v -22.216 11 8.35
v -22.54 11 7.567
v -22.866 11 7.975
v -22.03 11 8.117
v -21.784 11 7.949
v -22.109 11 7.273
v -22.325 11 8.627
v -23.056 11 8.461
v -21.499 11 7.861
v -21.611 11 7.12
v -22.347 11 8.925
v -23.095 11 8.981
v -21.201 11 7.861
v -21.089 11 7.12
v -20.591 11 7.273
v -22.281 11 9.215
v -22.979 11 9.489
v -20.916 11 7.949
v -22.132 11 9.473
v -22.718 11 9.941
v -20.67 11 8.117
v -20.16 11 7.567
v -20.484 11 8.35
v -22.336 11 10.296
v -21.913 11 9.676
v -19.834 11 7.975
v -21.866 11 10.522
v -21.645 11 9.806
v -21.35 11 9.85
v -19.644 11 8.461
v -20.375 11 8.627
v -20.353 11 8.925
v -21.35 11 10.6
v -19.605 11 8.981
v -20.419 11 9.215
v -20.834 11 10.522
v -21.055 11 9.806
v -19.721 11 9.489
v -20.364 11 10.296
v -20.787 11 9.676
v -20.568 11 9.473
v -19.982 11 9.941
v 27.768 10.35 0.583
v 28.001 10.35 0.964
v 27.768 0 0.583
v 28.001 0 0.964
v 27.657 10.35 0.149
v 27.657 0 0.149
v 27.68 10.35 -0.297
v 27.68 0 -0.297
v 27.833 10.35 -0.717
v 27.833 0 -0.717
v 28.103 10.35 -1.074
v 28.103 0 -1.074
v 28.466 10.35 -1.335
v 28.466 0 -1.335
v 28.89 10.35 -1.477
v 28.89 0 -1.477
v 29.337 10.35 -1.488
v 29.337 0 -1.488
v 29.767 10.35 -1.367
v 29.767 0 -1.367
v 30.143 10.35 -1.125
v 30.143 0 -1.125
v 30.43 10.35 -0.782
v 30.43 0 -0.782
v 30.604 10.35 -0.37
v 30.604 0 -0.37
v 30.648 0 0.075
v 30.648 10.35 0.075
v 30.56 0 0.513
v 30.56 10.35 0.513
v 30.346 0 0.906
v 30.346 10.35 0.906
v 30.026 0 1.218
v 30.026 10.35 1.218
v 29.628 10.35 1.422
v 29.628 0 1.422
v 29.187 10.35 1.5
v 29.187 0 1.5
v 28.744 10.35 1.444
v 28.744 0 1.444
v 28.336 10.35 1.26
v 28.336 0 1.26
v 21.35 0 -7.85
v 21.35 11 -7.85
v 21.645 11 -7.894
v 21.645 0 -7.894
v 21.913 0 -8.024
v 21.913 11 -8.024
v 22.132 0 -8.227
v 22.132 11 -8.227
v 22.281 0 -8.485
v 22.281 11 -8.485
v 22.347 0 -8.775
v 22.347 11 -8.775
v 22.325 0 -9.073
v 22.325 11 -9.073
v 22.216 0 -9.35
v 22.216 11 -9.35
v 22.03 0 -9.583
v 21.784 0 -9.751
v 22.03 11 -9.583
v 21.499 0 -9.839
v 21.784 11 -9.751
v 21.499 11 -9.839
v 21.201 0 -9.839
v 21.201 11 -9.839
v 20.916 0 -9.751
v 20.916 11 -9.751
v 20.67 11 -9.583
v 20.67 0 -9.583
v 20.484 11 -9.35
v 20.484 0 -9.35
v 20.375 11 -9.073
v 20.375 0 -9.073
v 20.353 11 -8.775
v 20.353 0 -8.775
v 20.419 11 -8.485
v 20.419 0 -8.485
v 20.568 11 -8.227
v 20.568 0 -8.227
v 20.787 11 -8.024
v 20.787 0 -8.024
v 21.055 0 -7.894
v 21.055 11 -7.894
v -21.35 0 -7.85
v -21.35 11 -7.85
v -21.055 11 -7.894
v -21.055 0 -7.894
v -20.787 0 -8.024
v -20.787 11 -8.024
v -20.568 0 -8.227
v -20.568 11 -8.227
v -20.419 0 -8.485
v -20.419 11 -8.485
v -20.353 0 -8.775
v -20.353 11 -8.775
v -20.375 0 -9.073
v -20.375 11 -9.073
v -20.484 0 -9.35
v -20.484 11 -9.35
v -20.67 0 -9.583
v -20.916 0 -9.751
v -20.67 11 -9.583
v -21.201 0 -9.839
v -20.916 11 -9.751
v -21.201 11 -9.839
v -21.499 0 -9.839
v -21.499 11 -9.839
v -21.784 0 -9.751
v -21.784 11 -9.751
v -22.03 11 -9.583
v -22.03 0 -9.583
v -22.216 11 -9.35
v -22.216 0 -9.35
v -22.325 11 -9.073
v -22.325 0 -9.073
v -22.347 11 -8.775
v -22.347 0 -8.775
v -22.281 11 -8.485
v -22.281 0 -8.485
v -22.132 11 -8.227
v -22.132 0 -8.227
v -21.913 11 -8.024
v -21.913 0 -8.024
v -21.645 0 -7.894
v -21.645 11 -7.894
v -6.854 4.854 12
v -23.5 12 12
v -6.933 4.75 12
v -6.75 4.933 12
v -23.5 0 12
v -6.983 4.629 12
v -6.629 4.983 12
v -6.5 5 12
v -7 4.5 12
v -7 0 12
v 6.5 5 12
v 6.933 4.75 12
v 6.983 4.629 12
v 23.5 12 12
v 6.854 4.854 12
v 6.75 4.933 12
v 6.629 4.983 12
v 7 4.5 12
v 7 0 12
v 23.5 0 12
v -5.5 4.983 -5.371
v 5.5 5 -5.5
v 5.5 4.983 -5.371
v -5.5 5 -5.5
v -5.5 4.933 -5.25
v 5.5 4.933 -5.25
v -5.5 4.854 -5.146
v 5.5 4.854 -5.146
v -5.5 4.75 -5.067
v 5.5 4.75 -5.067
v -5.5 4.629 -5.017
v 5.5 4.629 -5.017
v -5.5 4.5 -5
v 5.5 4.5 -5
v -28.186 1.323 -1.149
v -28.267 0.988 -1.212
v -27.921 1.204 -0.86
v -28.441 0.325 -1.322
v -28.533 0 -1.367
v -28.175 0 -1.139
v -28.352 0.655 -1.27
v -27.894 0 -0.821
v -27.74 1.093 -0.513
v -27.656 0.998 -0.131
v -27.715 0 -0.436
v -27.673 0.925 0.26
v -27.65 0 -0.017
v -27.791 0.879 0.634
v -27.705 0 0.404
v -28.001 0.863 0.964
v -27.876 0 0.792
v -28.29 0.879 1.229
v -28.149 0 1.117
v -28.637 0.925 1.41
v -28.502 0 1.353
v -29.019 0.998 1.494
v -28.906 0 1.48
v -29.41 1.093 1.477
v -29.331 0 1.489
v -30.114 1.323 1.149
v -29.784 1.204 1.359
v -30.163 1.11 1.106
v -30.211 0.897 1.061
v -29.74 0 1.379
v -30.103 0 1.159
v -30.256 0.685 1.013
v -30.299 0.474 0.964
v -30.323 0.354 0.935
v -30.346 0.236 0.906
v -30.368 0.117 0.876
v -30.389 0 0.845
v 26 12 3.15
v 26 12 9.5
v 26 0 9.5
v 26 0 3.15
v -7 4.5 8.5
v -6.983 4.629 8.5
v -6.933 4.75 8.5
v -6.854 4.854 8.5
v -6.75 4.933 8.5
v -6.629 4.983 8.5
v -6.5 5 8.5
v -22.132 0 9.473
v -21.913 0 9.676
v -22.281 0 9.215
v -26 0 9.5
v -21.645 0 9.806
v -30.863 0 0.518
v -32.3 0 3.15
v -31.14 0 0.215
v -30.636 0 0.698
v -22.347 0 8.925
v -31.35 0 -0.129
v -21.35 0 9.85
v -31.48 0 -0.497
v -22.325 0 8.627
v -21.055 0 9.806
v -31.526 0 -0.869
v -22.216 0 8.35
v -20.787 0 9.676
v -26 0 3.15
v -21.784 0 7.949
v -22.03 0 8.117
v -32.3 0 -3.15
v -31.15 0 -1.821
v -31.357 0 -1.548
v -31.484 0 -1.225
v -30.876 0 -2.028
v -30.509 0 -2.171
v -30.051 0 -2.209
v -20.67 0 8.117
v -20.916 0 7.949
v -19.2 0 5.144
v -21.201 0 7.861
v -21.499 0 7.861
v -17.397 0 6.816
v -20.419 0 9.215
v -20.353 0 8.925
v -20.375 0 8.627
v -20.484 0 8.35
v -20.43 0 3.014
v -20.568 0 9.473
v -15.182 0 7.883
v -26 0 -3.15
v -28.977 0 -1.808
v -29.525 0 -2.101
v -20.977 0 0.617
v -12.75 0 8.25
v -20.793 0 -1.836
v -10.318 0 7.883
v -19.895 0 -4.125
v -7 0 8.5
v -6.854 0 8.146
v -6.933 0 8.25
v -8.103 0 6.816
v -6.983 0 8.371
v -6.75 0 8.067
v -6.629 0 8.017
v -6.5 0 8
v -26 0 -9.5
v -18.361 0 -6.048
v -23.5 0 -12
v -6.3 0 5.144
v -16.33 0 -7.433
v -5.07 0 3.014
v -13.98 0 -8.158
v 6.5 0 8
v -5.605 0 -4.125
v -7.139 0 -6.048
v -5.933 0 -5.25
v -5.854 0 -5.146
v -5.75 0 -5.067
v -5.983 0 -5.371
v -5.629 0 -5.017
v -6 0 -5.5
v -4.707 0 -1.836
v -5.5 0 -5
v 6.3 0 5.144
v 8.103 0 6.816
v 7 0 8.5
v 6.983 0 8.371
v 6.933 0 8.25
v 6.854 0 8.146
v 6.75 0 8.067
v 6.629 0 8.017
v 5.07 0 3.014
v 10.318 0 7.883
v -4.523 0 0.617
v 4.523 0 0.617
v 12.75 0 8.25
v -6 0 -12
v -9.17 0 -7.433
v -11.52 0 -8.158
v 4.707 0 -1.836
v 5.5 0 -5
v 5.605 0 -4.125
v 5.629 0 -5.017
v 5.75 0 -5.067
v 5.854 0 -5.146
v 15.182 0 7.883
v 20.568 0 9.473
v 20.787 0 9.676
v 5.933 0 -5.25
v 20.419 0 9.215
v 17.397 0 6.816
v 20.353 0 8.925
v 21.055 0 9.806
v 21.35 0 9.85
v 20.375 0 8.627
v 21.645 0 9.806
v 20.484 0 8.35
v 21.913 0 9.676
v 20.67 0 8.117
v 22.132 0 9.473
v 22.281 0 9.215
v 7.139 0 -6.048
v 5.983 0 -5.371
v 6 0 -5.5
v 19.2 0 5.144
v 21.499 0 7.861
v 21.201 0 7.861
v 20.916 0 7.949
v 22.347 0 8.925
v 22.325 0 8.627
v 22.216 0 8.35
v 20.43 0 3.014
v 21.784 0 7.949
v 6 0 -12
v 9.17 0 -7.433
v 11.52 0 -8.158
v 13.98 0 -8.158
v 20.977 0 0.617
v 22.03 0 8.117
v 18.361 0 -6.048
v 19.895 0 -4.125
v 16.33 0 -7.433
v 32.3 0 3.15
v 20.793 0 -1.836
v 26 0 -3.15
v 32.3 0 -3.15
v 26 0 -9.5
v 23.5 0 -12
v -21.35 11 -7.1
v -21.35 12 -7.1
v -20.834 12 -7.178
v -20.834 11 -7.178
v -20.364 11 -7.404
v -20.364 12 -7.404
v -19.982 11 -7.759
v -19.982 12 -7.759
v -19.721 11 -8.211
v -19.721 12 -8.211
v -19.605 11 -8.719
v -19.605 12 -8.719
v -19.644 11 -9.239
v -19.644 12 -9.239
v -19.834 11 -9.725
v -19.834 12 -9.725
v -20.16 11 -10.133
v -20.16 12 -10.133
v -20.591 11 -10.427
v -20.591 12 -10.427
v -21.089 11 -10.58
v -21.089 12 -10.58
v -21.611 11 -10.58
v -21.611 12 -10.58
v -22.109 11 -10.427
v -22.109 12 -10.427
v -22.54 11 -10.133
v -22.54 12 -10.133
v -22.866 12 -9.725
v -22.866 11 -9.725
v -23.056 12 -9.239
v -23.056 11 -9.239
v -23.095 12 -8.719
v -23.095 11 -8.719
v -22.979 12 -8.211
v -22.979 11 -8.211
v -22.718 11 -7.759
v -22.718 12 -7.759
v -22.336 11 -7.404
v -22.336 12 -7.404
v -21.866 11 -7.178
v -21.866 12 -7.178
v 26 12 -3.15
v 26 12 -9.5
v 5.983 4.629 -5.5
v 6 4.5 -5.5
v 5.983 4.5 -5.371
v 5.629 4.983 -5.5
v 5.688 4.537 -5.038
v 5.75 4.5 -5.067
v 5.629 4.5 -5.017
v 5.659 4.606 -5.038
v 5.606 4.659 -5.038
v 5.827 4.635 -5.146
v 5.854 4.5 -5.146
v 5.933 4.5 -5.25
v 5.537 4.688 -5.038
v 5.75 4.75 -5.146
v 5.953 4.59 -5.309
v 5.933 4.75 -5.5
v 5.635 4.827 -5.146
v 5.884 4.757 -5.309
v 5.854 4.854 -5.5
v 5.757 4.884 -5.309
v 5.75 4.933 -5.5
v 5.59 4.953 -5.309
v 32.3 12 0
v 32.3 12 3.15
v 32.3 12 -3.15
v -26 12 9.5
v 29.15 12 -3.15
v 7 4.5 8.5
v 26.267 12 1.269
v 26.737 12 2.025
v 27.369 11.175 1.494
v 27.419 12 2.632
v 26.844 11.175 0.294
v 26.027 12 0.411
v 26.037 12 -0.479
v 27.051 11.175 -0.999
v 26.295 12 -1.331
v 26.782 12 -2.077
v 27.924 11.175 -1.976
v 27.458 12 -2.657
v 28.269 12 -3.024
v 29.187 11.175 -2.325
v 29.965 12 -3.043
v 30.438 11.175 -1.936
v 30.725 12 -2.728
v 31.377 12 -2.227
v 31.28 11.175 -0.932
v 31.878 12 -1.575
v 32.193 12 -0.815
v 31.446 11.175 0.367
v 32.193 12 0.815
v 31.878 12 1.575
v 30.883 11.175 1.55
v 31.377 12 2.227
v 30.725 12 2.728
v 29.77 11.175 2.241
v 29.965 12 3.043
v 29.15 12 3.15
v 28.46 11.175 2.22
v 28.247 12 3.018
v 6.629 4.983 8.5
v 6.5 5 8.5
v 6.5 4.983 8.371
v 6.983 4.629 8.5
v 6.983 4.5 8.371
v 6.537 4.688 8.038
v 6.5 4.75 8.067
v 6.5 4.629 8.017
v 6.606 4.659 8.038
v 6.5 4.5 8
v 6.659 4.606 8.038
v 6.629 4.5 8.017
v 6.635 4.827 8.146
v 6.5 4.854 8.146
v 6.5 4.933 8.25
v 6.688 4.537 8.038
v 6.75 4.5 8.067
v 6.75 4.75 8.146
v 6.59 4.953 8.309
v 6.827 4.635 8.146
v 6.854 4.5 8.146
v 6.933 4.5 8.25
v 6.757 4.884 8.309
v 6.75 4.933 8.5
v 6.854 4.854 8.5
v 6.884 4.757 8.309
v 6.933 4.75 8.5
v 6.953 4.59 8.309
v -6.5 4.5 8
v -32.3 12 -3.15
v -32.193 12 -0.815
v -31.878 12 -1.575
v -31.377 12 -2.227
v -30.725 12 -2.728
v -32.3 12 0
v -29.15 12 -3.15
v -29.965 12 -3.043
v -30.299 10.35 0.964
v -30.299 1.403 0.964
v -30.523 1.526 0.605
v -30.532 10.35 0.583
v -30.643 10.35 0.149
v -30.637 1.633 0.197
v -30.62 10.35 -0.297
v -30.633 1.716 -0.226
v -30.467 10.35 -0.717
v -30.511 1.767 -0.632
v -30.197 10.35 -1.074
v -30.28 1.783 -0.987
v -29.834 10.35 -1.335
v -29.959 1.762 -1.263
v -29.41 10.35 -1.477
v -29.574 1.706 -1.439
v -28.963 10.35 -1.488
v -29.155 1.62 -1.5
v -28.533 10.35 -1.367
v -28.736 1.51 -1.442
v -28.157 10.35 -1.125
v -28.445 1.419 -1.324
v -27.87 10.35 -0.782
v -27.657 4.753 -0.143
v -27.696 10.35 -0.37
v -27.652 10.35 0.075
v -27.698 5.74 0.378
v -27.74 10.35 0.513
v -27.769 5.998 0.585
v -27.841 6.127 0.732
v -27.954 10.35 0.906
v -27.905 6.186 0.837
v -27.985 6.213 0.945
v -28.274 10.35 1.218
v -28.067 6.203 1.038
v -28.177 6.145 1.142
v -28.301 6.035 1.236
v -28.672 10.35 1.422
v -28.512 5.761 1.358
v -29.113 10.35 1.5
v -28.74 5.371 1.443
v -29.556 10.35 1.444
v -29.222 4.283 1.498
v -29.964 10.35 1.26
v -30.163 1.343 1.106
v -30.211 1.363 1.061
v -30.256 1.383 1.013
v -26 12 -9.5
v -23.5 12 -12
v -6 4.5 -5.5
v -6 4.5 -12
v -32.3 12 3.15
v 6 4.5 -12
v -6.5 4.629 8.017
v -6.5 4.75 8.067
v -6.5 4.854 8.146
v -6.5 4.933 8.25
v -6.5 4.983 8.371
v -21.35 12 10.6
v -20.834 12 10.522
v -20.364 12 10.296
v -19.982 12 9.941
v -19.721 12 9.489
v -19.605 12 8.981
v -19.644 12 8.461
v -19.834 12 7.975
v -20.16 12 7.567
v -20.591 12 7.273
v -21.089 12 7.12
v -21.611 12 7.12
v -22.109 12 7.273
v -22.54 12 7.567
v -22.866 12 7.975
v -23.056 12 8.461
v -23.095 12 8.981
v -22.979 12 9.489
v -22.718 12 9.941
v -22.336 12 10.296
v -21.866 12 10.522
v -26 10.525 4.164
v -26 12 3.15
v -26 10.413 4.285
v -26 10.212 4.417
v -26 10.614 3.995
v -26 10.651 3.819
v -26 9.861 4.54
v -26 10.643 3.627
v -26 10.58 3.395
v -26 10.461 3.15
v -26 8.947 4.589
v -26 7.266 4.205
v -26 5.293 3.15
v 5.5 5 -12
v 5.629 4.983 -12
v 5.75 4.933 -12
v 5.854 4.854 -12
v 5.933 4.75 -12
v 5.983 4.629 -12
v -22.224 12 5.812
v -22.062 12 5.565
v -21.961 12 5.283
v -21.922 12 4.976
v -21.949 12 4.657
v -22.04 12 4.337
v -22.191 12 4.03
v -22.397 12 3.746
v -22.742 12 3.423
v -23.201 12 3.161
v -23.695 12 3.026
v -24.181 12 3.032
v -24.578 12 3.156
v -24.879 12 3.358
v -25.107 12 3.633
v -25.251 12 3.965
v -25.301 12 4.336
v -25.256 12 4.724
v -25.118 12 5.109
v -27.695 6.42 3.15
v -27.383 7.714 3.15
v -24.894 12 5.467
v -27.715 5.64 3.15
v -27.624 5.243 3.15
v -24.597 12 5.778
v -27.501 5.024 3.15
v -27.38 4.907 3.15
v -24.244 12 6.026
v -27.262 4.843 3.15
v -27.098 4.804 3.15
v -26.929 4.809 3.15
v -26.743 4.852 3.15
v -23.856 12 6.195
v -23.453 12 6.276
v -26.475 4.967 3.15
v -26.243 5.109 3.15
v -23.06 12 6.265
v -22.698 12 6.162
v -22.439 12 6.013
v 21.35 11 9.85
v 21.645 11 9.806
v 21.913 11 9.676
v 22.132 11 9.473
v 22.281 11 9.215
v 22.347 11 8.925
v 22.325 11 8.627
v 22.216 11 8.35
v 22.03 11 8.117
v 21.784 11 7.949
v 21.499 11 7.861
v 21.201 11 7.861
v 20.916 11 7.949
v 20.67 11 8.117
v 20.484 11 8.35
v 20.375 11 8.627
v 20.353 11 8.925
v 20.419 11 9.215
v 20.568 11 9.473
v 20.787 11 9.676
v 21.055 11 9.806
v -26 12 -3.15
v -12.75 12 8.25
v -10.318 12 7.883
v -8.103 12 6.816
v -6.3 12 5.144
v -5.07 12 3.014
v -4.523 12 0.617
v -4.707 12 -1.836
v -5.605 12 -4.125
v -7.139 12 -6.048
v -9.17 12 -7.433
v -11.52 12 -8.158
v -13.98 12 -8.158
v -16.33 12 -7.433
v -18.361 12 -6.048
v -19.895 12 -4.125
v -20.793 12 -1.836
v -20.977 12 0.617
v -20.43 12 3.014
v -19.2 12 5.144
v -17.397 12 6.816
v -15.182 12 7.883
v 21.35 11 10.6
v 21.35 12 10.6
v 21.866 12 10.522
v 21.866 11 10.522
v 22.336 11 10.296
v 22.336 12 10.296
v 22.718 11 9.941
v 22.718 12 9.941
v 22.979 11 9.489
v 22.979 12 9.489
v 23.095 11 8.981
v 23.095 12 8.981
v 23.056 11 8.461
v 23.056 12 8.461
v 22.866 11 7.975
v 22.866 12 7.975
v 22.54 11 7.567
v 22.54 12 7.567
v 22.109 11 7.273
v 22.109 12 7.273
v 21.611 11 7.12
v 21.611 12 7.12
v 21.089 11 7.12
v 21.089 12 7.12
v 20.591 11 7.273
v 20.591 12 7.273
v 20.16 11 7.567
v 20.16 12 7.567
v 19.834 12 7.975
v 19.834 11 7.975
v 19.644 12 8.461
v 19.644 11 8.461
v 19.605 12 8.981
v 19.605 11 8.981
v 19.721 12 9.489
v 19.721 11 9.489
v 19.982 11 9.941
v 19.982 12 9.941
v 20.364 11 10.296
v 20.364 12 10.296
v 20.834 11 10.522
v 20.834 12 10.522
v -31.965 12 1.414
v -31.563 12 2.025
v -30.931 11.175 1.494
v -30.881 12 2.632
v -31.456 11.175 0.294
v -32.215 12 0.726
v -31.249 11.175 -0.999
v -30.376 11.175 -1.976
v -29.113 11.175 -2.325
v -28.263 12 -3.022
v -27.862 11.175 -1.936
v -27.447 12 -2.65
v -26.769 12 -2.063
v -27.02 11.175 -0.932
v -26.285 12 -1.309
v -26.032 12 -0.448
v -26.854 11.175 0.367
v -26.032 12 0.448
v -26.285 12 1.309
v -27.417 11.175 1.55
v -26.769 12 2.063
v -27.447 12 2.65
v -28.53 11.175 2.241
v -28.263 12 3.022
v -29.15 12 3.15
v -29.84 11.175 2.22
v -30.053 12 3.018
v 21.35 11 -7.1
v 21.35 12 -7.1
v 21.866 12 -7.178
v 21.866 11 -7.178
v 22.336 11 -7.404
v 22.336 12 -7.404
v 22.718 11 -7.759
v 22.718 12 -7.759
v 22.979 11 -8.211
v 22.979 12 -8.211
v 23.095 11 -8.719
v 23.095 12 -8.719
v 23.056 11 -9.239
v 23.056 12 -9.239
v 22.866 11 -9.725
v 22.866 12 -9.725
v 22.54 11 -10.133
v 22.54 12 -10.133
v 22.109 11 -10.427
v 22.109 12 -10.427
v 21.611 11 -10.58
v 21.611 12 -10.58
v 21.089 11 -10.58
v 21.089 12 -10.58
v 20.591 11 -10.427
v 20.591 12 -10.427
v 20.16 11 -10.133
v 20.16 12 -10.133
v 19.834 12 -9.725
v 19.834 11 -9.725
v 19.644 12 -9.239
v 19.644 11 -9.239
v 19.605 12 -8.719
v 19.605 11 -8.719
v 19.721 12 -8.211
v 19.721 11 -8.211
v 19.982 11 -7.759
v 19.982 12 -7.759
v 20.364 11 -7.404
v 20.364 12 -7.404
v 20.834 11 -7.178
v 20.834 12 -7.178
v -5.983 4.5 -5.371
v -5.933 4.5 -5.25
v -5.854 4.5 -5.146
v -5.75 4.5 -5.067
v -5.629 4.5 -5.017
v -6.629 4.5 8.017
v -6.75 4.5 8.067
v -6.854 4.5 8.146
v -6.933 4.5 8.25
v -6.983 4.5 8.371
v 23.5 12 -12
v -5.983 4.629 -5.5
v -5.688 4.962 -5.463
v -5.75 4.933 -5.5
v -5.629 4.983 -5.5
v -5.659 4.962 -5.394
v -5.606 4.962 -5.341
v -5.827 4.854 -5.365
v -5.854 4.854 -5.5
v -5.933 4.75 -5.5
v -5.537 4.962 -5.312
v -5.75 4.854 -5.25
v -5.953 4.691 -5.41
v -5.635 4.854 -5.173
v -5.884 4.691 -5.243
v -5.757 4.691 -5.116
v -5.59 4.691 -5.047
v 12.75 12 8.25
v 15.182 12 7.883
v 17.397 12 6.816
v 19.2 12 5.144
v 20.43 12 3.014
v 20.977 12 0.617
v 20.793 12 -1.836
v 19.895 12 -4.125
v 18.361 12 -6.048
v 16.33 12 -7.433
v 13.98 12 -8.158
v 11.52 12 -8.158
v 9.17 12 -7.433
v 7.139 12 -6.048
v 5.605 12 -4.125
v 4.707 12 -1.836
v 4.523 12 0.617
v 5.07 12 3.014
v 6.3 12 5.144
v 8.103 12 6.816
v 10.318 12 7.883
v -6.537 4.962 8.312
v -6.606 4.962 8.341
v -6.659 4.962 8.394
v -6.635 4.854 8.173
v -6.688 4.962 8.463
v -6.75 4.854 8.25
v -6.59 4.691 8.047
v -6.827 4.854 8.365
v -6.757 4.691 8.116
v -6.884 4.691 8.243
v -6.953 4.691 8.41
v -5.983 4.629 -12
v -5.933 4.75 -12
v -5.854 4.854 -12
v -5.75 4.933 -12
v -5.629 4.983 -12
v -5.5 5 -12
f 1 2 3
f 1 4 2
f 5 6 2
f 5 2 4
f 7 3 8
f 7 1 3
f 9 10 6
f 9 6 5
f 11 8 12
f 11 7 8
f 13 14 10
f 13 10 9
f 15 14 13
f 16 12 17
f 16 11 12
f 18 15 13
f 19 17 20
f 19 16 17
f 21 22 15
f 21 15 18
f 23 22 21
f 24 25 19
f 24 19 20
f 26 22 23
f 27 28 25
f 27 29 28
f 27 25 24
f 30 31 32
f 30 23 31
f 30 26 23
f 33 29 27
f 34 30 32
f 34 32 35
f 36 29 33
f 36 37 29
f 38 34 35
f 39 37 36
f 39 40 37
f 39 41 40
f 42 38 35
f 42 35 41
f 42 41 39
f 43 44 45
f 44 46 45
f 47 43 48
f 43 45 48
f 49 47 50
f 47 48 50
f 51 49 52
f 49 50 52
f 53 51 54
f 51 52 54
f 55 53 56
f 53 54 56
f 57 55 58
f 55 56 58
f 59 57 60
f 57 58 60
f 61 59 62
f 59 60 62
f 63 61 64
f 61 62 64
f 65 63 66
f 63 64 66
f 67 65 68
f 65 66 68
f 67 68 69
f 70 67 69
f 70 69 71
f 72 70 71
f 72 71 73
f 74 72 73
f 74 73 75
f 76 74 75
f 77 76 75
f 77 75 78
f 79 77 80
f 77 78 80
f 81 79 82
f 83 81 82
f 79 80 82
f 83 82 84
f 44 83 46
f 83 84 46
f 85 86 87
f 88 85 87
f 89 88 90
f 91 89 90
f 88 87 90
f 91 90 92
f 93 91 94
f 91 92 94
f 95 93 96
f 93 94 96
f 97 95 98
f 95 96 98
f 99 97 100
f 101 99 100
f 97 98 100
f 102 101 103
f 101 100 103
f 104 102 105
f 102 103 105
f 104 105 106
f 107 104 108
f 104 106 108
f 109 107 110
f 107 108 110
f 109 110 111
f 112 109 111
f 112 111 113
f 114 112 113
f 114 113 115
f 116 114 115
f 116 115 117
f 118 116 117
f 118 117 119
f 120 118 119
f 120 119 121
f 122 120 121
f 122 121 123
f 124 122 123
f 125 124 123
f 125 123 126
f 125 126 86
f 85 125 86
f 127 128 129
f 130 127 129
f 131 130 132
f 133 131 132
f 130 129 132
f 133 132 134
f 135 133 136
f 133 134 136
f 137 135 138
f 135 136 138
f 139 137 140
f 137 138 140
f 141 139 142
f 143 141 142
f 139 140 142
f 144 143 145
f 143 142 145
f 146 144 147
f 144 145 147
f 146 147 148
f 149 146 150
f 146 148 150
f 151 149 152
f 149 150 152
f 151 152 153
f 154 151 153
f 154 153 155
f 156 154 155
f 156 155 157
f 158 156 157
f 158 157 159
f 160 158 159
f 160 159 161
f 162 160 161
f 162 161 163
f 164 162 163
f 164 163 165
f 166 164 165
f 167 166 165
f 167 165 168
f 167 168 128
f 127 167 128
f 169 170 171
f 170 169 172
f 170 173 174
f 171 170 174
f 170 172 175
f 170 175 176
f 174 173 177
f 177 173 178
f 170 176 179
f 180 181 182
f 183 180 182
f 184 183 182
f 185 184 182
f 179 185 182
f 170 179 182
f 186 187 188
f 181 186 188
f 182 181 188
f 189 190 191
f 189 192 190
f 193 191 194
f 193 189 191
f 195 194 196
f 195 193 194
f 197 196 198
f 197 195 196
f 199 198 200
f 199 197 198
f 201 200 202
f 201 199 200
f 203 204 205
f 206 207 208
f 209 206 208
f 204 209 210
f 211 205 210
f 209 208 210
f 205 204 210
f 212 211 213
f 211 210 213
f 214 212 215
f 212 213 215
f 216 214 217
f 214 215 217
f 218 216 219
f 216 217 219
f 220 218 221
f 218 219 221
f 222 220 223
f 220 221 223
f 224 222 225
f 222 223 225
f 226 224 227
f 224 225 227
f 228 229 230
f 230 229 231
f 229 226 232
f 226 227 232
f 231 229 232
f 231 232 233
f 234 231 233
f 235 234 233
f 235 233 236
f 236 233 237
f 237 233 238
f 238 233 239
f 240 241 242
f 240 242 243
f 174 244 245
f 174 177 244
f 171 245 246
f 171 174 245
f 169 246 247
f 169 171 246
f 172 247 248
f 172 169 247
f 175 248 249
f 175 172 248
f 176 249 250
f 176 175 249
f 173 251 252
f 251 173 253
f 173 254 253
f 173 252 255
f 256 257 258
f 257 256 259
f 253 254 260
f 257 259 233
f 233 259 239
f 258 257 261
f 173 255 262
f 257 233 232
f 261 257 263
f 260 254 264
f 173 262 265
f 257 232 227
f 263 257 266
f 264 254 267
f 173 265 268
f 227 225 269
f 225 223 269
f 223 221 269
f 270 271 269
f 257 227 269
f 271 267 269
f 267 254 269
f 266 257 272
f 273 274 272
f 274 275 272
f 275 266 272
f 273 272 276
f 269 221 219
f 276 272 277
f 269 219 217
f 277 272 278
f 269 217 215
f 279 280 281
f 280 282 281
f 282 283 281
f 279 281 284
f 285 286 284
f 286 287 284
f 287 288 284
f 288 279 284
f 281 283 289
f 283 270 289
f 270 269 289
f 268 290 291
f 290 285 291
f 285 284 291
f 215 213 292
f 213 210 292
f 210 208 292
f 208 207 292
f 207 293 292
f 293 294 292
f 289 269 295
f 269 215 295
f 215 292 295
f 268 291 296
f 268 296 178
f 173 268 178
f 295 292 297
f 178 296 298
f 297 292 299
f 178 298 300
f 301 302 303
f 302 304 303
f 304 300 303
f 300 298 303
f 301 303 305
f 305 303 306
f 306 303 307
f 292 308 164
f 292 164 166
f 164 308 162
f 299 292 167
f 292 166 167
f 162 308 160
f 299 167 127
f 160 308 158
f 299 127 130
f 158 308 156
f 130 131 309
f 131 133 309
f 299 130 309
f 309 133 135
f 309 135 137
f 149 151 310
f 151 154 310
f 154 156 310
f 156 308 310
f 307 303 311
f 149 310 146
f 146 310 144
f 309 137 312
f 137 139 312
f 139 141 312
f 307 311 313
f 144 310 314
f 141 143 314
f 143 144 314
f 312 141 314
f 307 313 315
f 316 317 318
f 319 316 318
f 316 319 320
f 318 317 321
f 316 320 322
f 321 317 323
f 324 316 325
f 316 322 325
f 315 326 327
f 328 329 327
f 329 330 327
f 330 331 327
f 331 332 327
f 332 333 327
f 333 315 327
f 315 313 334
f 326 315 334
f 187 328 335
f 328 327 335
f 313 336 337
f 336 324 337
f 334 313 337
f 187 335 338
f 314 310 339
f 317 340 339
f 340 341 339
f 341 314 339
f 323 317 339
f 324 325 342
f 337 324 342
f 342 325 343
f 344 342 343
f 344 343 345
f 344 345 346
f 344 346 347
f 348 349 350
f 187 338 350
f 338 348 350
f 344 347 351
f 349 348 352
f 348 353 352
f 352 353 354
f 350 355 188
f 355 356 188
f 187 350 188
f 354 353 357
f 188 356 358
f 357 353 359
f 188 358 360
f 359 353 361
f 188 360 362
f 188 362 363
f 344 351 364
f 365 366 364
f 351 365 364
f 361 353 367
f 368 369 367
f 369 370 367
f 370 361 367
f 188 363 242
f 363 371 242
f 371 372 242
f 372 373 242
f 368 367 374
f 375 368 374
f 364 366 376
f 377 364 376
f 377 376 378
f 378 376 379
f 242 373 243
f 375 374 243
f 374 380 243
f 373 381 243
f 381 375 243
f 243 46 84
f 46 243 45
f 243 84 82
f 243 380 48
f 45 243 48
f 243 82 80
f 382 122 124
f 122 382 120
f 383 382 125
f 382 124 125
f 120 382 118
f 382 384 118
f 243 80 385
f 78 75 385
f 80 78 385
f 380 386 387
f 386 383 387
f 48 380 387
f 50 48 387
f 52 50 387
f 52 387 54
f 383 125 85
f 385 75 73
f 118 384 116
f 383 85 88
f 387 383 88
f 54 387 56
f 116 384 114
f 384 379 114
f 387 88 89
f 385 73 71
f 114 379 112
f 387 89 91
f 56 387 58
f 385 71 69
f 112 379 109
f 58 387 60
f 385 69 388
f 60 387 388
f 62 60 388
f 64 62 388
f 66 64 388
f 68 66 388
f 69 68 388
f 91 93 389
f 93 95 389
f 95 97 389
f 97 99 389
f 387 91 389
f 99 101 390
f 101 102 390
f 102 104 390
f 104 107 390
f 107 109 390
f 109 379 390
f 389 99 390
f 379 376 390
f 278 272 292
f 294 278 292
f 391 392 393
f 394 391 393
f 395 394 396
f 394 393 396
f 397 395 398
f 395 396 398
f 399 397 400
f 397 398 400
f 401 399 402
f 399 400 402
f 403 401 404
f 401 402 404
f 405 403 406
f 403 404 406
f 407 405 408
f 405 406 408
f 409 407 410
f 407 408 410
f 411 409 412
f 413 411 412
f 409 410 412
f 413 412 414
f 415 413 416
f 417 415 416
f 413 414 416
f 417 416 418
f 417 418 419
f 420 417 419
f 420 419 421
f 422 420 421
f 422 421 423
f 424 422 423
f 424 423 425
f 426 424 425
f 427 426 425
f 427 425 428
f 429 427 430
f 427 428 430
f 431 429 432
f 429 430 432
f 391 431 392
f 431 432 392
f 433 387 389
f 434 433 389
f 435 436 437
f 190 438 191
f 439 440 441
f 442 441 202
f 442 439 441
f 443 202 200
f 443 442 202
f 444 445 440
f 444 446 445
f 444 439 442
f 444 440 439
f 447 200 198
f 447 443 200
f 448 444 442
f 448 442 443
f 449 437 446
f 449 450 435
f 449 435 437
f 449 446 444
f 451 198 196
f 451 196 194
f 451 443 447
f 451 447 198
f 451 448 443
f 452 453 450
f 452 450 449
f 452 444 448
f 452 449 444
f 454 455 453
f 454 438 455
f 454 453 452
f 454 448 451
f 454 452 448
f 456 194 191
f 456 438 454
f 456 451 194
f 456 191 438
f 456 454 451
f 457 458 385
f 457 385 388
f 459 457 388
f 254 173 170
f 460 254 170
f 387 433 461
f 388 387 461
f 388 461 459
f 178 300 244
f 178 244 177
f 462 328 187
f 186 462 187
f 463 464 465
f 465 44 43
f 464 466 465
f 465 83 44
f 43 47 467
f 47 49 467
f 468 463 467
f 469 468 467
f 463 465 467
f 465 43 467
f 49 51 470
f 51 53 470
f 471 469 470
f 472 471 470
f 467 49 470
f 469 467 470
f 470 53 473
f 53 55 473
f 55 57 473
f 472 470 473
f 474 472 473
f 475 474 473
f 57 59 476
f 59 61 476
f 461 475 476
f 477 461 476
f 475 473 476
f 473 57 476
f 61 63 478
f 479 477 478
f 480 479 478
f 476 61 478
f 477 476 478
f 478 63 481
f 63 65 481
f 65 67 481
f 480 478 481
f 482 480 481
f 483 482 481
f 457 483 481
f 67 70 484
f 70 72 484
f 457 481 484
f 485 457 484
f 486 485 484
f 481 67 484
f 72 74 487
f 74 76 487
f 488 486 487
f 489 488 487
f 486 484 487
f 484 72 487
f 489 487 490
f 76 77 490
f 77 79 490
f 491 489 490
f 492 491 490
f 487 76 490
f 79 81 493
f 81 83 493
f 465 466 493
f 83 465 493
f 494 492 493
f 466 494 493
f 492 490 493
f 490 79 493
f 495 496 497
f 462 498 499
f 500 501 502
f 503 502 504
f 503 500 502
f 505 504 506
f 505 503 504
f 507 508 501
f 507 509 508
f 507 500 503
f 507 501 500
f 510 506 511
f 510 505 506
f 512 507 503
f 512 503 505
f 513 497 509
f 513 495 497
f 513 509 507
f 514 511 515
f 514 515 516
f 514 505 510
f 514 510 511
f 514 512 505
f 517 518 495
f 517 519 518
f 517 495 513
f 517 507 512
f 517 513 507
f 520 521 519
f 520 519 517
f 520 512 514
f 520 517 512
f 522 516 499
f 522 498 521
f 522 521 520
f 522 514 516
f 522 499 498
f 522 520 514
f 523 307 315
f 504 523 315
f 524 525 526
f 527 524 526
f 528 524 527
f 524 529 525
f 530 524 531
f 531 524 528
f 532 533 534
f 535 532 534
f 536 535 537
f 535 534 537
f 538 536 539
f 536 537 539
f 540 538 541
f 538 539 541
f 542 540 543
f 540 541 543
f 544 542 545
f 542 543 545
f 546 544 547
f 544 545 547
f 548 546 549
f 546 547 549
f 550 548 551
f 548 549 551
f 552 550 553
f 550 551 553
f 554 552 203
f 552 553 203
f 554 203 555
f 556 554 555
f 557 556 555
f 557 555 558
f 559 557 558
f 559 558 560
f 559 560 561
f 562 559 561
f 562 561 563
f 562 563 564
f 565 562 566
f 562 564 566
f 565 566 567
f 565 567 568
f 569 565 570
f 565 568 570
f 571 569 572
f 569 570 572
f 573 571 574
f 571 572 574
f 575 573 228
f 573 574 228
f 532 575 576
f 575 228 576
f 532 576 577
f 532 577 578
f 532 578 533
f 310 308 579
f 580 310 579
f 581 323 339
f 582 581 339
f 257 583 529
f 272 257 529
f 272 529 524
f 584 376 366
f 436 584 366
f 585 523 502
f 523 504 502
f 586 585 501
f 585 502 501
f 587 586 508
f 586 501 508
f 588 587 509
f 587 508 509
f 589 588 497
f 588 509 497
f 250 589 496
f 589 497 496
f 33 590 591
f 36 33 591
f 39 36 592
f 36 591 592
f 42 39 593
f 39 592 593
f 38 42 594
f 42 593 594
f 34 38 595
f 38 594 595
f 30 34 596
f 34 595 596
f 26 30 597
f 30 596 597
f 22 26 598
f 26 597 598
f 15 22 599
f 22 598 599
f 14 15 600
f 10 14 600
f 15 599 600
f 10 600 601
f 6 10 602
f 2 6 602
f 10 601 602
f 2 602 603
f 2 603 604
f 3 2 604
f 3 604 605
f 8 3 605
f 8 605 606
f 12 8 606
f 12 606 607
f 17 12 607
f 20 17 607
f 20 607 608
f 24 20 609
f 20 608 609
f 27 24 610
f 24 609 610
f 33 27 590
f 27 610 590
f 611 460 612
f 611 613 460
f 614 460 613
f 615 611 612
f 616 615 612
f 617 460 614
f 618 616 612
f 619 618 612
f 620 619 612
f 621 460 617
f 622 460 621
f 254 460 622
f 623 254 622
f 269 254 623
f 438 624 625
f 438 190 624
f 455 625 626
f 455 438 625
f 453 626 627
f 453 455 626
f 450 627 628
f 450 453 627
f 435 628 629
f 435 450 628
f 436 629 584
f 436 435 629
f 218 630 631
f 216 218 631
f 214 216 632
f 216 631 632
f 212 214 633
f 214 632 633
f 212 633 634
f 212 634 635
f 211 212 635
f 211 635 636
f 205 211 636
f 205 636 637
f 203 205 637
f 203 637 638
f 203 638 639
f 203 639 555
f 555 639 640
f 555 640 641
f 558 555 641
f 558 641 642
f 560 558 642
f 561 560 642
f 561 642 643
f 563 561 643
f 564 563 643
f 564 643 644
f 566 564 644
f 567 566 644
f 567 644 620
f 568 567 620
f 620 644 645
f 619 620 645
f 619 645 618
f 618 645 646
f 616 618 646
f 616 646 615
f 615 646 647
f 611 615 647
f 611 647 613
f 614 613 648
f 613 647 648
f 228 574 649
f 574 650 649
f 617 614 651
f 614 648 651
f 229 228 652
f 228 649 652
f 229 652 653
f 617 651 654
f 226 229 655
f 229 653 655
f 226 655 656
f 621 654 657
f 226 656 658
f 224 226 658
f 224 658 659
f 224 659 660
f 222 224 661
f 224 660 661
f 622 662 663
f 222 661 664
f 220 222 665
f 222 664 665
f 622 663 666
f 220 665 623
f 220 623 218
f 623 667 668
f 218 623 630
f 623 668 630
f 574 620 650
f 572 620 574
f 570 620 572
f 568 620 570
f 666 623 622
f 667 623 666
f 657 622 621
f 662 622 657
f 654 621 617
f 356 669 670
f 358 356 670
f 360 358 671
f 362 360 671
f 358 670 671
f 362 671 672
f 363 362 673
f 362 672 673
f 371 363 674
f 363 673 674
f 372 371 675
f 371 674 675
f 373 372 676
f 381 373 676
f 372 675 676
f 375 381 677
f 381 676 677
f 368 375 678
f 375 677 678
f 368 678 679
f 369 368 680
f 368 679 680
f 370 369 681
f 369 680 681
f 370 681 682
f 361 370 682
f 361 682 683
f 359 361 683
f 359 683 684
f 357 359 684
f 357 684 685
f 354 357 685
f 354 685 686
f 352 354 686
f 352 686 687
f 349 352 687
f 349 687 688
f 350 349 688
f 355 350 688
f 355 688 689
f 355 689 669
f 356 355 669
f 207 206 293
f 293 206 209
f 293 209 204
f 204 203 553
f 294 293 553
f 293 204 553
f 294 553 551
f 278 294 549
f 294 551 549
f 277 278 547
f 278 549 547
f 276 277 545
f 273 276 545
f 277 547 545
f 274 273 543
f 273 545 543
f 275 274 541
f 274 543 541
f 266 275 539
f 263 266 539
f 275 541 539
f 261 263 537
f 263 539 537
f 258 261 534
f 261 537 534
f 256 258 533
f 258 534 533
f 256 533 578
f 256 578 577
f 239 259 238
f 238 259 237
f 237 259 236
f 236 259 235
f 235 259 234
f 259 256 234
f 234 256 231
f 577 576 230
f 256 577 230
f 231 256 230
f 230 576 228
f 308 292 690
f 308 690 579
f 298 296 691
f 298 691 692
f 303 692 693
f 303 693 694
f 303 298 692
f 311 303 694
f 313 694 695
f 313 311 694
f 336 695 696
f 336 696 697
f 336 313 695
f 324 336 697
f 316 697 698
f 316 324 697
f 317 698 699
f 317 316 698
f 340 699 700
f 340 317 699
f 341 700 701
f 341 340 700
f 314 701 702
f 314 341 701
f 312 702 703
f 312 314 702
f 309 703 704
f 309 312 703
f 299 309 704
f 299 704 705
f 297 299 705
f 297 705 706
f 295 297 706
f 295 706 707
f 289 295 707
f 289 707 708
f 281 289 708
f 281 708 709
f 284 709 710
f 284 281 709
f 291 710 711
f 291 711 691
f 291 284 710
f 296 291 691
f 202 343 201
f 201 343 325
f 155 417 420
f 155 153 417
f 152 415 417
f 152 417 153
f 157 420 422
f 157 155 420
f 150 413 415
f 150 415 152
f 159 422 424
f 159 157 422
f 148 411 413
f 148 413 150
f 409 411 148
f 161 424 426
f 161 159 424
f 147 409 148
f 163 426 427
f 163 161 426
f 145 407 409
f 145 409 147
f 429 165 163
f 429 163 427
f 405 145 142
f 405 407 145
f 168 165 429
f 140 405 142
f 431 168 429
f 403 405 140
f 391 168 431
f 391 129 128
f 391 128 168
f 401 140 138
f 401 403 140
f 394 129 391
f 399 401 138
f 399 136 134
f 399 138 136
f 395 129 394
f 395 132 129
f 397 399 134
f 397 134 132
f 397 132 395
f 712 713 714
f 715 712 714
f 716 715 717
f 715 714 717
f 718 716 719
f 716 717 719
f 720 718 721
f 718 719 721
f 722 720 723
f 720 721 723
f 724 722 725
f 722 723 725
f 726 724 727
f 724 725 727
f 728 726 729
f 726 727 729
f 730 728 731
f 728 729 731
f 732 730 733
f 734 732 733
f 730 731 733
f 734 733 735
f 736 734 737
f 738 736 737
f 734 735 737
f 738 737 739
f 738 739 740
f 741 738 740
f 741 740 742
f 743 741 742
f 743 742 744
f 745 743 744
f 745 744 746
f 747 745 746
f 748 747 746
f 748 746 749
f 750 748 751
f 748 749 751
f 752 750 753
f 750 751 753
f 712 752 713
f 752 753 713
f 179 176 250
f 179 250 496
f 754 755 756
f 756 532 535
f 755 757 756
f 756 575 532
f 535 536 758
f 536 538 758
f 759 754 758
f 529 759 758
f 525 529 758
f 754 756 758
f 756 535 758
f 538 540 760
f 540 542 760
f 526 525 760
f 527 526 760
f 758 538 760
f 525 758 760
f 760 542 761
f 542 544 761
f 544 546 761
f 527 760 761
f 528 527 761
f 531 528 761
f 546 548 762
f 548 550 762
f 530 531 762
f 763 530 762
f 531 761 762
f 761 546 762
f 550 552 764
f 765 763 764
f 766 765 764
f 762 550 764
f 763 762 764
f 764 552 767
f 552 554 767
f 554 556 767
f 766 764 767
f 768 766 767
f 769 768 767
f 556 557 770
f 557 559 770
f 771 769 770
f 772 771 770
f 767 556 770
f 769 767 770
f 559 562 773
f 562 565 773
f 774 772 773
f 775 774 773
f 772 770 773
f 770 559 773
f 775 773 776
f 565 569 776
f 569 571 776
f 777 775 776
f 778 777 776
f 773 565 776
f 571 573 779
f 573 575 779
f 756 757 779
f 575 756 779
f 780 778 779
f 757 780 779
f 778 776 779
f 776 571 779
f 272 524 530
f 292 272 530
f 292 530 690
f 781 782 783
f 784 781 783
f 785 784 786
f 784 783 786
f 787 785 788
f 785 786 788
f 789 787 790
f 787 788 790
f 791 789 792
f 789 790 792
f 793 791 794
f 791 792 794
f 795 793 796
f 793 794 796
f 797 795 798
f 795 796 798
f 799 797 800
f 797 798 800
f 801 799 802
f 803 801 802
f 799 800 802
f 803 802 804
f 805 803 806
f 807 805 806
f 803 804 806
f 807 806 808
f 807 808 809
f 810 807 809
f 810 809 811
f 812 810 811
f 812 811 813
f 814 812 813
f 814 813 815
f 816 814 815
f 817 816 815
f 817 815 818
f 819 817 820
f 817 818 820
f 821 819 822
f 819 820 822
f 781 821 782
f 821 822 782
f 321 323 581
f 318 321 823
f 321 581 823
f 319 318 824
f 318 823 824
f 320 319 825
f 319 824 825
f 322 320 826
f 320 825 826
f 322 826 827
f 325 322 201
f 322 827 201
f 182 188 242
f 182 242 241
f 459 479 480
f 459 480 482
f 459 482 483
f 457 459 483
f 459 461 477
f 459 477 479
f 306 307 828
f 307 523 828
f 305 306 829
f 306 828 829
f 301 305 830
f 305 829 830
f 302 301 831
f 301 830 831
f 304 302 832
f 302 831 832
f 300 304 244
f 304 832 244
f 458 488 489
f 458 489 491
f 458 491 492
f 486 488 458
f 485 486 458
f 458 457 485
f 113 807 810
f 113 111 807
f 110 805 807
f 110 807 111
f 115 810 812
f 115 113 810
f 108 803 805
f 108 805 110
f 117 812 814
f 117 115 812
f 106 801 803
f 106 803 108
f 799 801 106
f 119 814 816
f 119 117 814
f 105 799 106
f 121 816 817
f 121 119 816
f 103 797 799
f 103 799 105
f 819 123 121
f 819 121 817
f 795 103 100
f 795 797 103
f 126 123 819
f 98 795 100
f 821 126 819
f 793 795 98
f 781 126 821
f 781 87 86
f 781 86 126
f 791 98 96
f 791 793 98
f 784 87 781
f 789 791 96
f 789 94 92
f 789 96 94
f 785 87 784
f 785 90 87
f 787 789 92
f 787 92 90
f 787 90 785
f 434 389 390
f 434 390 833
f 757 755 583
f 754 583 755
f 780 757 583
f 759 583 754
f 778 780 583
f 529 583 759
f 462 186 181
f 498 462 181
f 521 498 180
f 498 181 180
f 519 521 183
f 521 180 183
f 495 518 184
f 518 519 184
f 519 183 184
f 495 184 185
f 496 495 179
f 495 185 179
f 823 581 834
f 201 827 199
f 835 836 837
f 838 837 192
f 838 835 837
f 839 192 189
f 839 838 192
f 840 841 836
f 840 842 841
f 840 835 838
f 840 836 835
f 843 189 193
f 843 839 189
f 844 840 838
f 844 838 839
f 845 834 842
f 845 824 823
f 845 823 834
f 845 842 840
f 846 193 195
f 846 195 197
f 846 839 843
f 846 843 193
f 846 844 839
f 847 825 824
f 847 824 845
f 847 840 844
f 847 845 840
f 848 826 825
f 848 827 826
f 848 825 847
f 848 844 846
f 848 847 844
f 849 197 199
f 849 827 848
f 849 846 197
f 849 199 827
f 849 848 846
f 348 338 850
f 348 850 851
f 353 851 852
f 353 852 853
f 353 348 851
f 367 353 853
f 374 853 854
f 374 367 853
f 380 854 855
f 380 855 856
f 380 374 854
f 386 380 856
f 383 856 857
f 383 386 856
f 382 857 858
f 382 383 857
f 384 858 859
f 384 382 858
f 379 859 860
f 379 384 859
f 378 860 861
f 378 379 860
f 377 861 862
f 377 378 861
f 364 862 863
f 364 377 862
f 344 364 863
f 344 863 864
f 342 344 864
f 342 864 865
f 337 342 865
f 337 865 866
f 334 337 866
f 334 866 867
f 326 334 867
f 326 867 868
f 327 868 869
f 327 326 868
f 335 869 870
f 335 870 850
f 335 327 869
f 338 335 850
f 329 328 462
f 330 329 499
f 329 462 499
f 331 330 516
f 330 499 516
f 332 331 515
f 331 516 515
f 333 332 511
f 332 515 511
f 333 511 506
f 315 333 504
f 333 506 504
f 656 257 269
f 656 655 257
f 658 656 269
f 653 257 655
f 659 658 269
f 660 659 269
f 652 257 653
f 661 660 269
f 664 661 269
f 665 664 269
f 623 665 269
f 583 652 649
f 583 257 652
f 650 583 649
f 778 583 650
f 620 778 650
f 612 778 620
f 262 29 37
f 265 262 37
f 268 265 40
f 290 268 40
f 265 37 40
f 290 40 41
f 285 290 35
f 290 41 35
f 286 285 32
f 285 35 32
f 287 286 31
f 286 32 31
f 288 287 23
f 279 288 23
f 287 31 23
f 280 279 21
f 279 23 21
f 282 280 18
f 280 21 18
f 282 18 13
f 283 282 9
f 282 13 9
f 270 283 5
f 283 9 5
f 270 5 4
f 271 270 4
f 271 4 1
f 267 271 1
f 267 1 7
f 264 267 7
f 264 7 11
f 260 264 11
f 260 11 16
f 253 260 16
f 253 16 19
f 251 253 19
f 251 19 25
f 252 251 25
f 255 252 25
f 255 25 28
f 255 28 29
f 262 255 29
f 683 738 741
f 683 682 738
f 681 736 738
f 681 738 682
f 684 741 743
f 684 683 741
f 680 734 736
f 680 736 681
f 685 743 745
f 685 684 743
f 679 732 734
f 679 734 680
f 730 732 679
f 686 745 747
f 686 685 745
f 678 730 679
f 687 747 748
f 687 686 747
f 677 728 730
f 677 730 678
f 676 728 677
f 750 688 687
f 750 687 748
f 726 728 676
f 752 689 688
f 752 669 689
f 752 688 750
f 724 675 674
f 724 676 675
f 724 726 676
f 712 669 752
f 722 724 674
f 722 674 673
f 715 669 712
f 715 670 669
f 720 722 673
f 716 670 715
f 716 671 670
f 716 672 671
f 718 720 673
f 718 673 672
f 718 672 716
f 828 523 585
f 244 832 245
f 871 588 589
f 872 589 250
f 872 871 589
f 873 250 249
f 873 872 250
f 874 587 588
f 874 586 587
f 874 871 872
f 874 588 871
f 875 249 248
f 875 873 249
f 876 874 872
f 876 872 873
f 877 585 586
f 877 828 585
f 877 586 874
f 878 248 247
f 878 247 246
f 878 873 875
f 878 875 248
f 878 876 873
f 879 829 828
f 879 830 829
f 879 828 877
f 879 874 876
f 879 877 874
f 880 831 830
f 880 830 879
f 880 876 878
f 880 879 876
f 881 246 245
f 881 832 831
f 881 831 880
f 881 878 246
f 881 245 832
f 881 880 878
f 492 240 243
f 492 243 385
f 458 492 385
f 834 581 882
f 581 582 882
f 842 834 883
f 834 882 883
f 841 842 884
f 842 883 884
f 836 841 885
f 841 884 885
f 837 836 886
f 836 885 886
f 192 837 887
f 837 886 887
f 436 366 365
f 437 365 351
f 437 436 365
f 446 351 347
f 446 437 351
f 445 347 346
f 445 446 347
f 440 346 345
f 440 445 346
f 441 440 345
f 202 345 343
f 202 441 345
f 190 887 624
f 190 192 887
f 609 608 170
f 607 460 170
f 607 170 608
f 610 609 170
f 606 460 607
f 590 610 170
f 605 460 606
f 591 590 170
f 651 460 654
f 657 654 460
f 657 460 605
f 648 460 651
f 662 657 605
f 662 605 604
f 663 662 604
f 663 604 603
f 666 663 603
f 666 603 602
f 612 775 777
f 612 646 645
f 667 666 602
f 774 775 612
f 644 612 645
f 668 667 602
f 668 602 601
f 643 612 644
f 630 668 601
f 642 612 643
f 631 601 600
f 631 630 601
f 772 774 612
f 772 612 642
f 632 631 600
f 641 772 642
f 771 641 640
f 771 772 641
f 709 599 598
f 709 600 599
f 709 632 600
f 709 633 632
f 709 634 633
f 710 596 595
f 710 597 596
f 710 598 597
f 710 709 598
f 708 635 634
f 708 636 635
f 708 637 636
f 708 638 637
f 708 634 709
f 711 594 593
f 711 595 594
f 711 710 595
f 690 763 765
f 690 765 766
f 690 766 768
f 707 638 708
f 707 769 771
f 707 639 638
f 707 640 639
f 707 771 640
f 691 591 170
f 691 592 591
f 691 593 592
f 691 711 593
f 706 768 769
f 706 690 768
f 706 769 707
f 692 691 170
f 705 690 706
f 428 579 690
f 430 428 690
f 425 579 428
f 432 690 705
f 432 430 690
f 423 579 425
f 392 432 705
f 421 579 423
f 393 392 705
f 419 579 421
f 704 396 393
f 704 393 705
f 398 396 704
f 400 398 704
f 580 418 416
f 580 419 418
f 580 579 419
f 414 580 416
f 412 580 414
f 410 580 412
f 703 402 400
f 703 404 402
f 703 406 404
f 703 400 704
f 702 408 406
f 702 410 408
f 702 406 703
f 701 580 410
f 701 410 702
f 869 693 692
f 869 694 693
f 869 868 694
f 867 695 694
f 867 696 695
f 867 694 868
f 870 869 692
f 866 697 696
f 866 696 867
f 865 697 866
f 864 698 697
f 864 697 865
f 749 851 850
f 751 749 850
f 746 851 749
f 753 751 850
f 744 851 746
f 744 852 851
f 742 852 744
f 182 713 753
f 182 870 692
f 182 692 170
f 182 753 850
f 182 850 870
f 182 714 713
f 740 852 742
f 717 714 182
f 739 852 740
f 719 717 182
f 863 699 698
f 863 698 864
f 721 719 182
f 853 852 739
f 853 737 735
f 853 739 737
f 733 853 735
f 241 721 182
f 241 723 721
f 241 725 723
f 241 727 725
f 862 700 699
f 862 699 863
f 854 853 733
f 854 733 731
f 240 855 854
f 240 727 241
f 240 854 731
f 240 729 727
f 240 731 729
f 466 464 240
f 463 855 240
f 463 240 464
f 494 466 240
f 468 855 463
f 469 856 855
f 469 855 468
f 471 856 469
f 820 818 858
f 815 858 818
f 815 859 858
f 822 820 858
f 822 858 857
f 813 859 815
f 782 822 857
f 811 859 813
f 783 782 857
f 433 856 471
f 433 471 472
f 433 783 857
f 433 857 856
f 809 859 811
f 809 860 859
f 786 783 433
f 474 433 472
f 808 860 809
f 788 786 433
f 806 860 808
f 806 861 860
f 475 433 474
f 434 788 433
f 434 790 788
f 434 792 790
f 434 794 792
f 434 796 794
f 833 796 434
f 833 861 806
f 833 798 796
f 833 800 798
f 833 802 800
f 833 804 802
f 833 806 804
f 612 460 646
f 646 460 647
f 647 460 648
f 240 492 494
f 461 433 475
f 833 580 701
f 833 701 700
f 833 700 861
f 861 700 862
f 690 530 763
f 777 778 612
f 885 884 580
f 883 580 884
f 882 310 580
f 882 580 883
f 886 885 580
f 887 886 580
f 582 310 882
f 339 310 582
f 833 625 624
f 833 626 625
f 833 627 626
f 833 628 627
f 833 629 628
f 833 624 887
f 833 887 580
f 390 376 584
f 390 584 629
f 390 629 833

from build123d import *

# Parameters (mm, degrees)
SKETCH1_W                     = 52
SKETCH1_H                     = 24
SKETCH1_R                     = 8.25
BOSS_EXTRUDE1_DEPTH           = 12
SKETCH2_R                     = 1
CUT_EXTRUDE1_DEPTH            = 32.048349393
SKETCH3_R                     = 1.75
CUT_EXTRUDE2_DEPTH            = 1
CUT_EXTRUDE3_DEPTH            = 5
FILLET3_R                     = 0.5
CHAMFER1_SIZE                 = 2.5
SKETCH5_W                     = 14
SKETCH5_H                     = 8
CUT_EXTRUDE4_DEPTH            = 5
FILLET4_R                     = 0.5
SKETCH6_W                     = 6.3
SKETCH6_H                     = 6.3
BOSS_EXTRUDE2_DEPTH           = 12
CSK_FOR_M3_SFHCS1_D           = 3
CSK_FOR_M3_SFHCS1_CSINK_D     = 6.3
CSK_FOR_M3_SFHCS1_CSINK_ANGLE = 90
CSK_FOR_M3_SFHCS2_D           = 3
CSK_FOR_M3_SFHCS2_DEPTH       = 109.998865618
CSK_FOR_M3_SFHCS2_CSINK_D     = 6.3
CSK_FOR_M3_SFHCS2_CSINK_ANGLE = 90


with BuildPart() as part:
    # Sketch1 → Boss-Extrude1 (new body)
    with BuildSketch(Plane(origin=(0, 0, 0), x_dir=(1, 0, 0), z_dir=(0, 1, 0))):
        Rectangle(SKETCH1_W, SKETCH1_H)
        with Locations(Location((12.75, 0, 0), (0, 0, 270))):
            Circle(SKETCH1_R, mode=Mode.SUBTRACT)
        with Locations(Location((-12.75, 0, 0), (0, 0, 270))):
            Circle(SKETCH1_R, mode=Mode.SUBTRACT)
    extrude(amount=BOSS_EXTRUDE1_DEPTH)

    # Sketch2 → Cut-Extrude1 (cut, through all)
    with BuildSketch(Plane(origin=(0, 12, 0), x_dir=(1, 0, 0), z_dir=(0, 1, 0))):
        with Locations(Location((-21.35, 8.85, 0), (0, 0, 270))):
            Circle(SKETCH2_R)
        with Locations(Location((21.35, 8.85, 0), (0, 0, 270))):
            Circle(SKETCH2_R)
        with Locations(Location((21.35, -8.85, 0), (0, 0, 270))):
            Circle(SKETCH2_R)
        with Locations(Location((-21.35, -8.85, 0), (0, 0, 270))):
            Circle(SKETCH2_R)
    extrude(amount=-CUT_EXTRUDE1_DEPTH, mode=Mode.SUBTRACT)

    # Sketch3 → Cut-Extrude2 (cut)
    with BuildSketch(Plane(origin=(0, 12, 0), x_dir=(1, 0, 0), z_dir=(0, 1, 0))):
        with Locations(Location((-21.35, 8.85, 0), (0, 0, 270))):
            Circle(SKETCH3_R)
        with Locations(Location((21.35, 8.85, 0), (0, 0, 270))):
            Circle(SKETCH3_R)
        with Locations(Location((21.35, -8.85, 0), (0, 0, 270))):
            Circle(SKETCH3_R)
        with Locations(Location((-21.35, -8.85, 0), (0, 0, 270))):
            Circle(SKETCH3_R)
    extrude(amount=-CUT_EXTRUDE2_DEPTH, mode=Mode.SUBTRACT)

    # Sketch4 → Cut-Extrude3 (cut)
    with BuildSketch(Plane.XZ):
        Polygon((-6, -5), (-6, -12), (6, -12), (6, -5), (0, -5), align=None)
    extrude(amount=-CUT_EXTRUDE3_DEPTH, mode=Mode.SUBTRACT)

    # Fillet3
    fillet3_edges = [part.edges().sort_by_distance(p)[0] for p in [
        (-6, 2.5, -5),
        (6, 5, -8.5),
        (6, 2.5, -5),
        (-6, 5, -8.5),
        (0, 5, -5),
    ]]
    fillet(fillet3_edges, radius=FILLET3_R)

    # Chamfer1
    chamfer1_edges = [part.edges().sort_by_distance(p)[0] for p in [
        (26, 6, 12),
        (-26, 6, 12),
        (-26, 6, -12),
        (26, 6, -12),
    ]]
    chamfer(chamfer1_edges, length=CHAMFER1_SIZE)

    # Sketch5 → Cut-Extrude4 (cut)
    with BuildSketch(Plane.XZ):
        with Locations((0, 12)):
            Rectangle(SKETCH5_W, SKETCH5_H)
    extrude(amount=-CUT_EXTRUDE4_DEPTH, mode=Mode.SUBTRACT)

    # Fillet4
    fillet4_edges = [part.edges().sort_by_distance(p)[0] for p in [
        (-7, 2.5, 8),
        (7, 5, 10),
        (0, 5, 8),
        (-7, 5, 10),
        (7, 2.5, 8),
    ]]
    fillet(fillet4_edges, radius=FILLET4_R)

    # Sketch6 → Boss-Extrude2 (add)
    with BuildSketch(Plane(origin=(0, 12, 0), x_dir=(1, 0, 0), z_dir=(0, 1, 0))):
        with Locations((-29.15, 0)):
            Rectangle(SKETCH6_W, SKETCH6_H)
        with Locations((29.15, 0)):
            Rectangle(SKETCH6_W, SKETCH6_H)
    extrude(amount=-BOSS_EXTRUDE2_DEPTH)

    # CSK for M3 SFHCS1 (through all)
    with Locations(Plane(origin=(1490.377712475, 12, 7.825775805), x_dir=(0.766044443118983, 0, -0.6427876096865334), z_dir=(0, 1, 0))):
        with Locations((-1114.335057549, 945.253960578), (-1158.995448583, 982.728478223)):
            CounterSinkHole(CSK_FOR_M3_SFHCS1_D / 2, CSK_FOR_M3_SFHCS1_CSINK_D / 2, counter_sink_angle=CSK_FOR_M3_SFHCS1_CSINK_ANGLE)

    # CSK for M3 SFHCS2
    with Locations(Plane(origin=(-1373.834887972, 567.783106147, 105.616816862), x_dir=(-0.6343091461006837, 0.5606811628058592, -0.5322485705454655), z_dir=(-0.42950668912891715, -0.8280317830099698, -0.3603989044362456))):
        with Locations((-1114.335057549, 945.253960578), (-1158.995448583, 982.728478223)):
            CounterSinkHole(CSK_FOR_M3_SFHCS2_D / 2, CSK_FOR_M3_SFHCS2_CSINK_D / 2, depth=CSK_FOR_M3_SFHCS2_DEPTH, counter_sink_angle=CSK_FOR_M3_SFHCS2_CSINK_ANGLE)


solid = part.part
